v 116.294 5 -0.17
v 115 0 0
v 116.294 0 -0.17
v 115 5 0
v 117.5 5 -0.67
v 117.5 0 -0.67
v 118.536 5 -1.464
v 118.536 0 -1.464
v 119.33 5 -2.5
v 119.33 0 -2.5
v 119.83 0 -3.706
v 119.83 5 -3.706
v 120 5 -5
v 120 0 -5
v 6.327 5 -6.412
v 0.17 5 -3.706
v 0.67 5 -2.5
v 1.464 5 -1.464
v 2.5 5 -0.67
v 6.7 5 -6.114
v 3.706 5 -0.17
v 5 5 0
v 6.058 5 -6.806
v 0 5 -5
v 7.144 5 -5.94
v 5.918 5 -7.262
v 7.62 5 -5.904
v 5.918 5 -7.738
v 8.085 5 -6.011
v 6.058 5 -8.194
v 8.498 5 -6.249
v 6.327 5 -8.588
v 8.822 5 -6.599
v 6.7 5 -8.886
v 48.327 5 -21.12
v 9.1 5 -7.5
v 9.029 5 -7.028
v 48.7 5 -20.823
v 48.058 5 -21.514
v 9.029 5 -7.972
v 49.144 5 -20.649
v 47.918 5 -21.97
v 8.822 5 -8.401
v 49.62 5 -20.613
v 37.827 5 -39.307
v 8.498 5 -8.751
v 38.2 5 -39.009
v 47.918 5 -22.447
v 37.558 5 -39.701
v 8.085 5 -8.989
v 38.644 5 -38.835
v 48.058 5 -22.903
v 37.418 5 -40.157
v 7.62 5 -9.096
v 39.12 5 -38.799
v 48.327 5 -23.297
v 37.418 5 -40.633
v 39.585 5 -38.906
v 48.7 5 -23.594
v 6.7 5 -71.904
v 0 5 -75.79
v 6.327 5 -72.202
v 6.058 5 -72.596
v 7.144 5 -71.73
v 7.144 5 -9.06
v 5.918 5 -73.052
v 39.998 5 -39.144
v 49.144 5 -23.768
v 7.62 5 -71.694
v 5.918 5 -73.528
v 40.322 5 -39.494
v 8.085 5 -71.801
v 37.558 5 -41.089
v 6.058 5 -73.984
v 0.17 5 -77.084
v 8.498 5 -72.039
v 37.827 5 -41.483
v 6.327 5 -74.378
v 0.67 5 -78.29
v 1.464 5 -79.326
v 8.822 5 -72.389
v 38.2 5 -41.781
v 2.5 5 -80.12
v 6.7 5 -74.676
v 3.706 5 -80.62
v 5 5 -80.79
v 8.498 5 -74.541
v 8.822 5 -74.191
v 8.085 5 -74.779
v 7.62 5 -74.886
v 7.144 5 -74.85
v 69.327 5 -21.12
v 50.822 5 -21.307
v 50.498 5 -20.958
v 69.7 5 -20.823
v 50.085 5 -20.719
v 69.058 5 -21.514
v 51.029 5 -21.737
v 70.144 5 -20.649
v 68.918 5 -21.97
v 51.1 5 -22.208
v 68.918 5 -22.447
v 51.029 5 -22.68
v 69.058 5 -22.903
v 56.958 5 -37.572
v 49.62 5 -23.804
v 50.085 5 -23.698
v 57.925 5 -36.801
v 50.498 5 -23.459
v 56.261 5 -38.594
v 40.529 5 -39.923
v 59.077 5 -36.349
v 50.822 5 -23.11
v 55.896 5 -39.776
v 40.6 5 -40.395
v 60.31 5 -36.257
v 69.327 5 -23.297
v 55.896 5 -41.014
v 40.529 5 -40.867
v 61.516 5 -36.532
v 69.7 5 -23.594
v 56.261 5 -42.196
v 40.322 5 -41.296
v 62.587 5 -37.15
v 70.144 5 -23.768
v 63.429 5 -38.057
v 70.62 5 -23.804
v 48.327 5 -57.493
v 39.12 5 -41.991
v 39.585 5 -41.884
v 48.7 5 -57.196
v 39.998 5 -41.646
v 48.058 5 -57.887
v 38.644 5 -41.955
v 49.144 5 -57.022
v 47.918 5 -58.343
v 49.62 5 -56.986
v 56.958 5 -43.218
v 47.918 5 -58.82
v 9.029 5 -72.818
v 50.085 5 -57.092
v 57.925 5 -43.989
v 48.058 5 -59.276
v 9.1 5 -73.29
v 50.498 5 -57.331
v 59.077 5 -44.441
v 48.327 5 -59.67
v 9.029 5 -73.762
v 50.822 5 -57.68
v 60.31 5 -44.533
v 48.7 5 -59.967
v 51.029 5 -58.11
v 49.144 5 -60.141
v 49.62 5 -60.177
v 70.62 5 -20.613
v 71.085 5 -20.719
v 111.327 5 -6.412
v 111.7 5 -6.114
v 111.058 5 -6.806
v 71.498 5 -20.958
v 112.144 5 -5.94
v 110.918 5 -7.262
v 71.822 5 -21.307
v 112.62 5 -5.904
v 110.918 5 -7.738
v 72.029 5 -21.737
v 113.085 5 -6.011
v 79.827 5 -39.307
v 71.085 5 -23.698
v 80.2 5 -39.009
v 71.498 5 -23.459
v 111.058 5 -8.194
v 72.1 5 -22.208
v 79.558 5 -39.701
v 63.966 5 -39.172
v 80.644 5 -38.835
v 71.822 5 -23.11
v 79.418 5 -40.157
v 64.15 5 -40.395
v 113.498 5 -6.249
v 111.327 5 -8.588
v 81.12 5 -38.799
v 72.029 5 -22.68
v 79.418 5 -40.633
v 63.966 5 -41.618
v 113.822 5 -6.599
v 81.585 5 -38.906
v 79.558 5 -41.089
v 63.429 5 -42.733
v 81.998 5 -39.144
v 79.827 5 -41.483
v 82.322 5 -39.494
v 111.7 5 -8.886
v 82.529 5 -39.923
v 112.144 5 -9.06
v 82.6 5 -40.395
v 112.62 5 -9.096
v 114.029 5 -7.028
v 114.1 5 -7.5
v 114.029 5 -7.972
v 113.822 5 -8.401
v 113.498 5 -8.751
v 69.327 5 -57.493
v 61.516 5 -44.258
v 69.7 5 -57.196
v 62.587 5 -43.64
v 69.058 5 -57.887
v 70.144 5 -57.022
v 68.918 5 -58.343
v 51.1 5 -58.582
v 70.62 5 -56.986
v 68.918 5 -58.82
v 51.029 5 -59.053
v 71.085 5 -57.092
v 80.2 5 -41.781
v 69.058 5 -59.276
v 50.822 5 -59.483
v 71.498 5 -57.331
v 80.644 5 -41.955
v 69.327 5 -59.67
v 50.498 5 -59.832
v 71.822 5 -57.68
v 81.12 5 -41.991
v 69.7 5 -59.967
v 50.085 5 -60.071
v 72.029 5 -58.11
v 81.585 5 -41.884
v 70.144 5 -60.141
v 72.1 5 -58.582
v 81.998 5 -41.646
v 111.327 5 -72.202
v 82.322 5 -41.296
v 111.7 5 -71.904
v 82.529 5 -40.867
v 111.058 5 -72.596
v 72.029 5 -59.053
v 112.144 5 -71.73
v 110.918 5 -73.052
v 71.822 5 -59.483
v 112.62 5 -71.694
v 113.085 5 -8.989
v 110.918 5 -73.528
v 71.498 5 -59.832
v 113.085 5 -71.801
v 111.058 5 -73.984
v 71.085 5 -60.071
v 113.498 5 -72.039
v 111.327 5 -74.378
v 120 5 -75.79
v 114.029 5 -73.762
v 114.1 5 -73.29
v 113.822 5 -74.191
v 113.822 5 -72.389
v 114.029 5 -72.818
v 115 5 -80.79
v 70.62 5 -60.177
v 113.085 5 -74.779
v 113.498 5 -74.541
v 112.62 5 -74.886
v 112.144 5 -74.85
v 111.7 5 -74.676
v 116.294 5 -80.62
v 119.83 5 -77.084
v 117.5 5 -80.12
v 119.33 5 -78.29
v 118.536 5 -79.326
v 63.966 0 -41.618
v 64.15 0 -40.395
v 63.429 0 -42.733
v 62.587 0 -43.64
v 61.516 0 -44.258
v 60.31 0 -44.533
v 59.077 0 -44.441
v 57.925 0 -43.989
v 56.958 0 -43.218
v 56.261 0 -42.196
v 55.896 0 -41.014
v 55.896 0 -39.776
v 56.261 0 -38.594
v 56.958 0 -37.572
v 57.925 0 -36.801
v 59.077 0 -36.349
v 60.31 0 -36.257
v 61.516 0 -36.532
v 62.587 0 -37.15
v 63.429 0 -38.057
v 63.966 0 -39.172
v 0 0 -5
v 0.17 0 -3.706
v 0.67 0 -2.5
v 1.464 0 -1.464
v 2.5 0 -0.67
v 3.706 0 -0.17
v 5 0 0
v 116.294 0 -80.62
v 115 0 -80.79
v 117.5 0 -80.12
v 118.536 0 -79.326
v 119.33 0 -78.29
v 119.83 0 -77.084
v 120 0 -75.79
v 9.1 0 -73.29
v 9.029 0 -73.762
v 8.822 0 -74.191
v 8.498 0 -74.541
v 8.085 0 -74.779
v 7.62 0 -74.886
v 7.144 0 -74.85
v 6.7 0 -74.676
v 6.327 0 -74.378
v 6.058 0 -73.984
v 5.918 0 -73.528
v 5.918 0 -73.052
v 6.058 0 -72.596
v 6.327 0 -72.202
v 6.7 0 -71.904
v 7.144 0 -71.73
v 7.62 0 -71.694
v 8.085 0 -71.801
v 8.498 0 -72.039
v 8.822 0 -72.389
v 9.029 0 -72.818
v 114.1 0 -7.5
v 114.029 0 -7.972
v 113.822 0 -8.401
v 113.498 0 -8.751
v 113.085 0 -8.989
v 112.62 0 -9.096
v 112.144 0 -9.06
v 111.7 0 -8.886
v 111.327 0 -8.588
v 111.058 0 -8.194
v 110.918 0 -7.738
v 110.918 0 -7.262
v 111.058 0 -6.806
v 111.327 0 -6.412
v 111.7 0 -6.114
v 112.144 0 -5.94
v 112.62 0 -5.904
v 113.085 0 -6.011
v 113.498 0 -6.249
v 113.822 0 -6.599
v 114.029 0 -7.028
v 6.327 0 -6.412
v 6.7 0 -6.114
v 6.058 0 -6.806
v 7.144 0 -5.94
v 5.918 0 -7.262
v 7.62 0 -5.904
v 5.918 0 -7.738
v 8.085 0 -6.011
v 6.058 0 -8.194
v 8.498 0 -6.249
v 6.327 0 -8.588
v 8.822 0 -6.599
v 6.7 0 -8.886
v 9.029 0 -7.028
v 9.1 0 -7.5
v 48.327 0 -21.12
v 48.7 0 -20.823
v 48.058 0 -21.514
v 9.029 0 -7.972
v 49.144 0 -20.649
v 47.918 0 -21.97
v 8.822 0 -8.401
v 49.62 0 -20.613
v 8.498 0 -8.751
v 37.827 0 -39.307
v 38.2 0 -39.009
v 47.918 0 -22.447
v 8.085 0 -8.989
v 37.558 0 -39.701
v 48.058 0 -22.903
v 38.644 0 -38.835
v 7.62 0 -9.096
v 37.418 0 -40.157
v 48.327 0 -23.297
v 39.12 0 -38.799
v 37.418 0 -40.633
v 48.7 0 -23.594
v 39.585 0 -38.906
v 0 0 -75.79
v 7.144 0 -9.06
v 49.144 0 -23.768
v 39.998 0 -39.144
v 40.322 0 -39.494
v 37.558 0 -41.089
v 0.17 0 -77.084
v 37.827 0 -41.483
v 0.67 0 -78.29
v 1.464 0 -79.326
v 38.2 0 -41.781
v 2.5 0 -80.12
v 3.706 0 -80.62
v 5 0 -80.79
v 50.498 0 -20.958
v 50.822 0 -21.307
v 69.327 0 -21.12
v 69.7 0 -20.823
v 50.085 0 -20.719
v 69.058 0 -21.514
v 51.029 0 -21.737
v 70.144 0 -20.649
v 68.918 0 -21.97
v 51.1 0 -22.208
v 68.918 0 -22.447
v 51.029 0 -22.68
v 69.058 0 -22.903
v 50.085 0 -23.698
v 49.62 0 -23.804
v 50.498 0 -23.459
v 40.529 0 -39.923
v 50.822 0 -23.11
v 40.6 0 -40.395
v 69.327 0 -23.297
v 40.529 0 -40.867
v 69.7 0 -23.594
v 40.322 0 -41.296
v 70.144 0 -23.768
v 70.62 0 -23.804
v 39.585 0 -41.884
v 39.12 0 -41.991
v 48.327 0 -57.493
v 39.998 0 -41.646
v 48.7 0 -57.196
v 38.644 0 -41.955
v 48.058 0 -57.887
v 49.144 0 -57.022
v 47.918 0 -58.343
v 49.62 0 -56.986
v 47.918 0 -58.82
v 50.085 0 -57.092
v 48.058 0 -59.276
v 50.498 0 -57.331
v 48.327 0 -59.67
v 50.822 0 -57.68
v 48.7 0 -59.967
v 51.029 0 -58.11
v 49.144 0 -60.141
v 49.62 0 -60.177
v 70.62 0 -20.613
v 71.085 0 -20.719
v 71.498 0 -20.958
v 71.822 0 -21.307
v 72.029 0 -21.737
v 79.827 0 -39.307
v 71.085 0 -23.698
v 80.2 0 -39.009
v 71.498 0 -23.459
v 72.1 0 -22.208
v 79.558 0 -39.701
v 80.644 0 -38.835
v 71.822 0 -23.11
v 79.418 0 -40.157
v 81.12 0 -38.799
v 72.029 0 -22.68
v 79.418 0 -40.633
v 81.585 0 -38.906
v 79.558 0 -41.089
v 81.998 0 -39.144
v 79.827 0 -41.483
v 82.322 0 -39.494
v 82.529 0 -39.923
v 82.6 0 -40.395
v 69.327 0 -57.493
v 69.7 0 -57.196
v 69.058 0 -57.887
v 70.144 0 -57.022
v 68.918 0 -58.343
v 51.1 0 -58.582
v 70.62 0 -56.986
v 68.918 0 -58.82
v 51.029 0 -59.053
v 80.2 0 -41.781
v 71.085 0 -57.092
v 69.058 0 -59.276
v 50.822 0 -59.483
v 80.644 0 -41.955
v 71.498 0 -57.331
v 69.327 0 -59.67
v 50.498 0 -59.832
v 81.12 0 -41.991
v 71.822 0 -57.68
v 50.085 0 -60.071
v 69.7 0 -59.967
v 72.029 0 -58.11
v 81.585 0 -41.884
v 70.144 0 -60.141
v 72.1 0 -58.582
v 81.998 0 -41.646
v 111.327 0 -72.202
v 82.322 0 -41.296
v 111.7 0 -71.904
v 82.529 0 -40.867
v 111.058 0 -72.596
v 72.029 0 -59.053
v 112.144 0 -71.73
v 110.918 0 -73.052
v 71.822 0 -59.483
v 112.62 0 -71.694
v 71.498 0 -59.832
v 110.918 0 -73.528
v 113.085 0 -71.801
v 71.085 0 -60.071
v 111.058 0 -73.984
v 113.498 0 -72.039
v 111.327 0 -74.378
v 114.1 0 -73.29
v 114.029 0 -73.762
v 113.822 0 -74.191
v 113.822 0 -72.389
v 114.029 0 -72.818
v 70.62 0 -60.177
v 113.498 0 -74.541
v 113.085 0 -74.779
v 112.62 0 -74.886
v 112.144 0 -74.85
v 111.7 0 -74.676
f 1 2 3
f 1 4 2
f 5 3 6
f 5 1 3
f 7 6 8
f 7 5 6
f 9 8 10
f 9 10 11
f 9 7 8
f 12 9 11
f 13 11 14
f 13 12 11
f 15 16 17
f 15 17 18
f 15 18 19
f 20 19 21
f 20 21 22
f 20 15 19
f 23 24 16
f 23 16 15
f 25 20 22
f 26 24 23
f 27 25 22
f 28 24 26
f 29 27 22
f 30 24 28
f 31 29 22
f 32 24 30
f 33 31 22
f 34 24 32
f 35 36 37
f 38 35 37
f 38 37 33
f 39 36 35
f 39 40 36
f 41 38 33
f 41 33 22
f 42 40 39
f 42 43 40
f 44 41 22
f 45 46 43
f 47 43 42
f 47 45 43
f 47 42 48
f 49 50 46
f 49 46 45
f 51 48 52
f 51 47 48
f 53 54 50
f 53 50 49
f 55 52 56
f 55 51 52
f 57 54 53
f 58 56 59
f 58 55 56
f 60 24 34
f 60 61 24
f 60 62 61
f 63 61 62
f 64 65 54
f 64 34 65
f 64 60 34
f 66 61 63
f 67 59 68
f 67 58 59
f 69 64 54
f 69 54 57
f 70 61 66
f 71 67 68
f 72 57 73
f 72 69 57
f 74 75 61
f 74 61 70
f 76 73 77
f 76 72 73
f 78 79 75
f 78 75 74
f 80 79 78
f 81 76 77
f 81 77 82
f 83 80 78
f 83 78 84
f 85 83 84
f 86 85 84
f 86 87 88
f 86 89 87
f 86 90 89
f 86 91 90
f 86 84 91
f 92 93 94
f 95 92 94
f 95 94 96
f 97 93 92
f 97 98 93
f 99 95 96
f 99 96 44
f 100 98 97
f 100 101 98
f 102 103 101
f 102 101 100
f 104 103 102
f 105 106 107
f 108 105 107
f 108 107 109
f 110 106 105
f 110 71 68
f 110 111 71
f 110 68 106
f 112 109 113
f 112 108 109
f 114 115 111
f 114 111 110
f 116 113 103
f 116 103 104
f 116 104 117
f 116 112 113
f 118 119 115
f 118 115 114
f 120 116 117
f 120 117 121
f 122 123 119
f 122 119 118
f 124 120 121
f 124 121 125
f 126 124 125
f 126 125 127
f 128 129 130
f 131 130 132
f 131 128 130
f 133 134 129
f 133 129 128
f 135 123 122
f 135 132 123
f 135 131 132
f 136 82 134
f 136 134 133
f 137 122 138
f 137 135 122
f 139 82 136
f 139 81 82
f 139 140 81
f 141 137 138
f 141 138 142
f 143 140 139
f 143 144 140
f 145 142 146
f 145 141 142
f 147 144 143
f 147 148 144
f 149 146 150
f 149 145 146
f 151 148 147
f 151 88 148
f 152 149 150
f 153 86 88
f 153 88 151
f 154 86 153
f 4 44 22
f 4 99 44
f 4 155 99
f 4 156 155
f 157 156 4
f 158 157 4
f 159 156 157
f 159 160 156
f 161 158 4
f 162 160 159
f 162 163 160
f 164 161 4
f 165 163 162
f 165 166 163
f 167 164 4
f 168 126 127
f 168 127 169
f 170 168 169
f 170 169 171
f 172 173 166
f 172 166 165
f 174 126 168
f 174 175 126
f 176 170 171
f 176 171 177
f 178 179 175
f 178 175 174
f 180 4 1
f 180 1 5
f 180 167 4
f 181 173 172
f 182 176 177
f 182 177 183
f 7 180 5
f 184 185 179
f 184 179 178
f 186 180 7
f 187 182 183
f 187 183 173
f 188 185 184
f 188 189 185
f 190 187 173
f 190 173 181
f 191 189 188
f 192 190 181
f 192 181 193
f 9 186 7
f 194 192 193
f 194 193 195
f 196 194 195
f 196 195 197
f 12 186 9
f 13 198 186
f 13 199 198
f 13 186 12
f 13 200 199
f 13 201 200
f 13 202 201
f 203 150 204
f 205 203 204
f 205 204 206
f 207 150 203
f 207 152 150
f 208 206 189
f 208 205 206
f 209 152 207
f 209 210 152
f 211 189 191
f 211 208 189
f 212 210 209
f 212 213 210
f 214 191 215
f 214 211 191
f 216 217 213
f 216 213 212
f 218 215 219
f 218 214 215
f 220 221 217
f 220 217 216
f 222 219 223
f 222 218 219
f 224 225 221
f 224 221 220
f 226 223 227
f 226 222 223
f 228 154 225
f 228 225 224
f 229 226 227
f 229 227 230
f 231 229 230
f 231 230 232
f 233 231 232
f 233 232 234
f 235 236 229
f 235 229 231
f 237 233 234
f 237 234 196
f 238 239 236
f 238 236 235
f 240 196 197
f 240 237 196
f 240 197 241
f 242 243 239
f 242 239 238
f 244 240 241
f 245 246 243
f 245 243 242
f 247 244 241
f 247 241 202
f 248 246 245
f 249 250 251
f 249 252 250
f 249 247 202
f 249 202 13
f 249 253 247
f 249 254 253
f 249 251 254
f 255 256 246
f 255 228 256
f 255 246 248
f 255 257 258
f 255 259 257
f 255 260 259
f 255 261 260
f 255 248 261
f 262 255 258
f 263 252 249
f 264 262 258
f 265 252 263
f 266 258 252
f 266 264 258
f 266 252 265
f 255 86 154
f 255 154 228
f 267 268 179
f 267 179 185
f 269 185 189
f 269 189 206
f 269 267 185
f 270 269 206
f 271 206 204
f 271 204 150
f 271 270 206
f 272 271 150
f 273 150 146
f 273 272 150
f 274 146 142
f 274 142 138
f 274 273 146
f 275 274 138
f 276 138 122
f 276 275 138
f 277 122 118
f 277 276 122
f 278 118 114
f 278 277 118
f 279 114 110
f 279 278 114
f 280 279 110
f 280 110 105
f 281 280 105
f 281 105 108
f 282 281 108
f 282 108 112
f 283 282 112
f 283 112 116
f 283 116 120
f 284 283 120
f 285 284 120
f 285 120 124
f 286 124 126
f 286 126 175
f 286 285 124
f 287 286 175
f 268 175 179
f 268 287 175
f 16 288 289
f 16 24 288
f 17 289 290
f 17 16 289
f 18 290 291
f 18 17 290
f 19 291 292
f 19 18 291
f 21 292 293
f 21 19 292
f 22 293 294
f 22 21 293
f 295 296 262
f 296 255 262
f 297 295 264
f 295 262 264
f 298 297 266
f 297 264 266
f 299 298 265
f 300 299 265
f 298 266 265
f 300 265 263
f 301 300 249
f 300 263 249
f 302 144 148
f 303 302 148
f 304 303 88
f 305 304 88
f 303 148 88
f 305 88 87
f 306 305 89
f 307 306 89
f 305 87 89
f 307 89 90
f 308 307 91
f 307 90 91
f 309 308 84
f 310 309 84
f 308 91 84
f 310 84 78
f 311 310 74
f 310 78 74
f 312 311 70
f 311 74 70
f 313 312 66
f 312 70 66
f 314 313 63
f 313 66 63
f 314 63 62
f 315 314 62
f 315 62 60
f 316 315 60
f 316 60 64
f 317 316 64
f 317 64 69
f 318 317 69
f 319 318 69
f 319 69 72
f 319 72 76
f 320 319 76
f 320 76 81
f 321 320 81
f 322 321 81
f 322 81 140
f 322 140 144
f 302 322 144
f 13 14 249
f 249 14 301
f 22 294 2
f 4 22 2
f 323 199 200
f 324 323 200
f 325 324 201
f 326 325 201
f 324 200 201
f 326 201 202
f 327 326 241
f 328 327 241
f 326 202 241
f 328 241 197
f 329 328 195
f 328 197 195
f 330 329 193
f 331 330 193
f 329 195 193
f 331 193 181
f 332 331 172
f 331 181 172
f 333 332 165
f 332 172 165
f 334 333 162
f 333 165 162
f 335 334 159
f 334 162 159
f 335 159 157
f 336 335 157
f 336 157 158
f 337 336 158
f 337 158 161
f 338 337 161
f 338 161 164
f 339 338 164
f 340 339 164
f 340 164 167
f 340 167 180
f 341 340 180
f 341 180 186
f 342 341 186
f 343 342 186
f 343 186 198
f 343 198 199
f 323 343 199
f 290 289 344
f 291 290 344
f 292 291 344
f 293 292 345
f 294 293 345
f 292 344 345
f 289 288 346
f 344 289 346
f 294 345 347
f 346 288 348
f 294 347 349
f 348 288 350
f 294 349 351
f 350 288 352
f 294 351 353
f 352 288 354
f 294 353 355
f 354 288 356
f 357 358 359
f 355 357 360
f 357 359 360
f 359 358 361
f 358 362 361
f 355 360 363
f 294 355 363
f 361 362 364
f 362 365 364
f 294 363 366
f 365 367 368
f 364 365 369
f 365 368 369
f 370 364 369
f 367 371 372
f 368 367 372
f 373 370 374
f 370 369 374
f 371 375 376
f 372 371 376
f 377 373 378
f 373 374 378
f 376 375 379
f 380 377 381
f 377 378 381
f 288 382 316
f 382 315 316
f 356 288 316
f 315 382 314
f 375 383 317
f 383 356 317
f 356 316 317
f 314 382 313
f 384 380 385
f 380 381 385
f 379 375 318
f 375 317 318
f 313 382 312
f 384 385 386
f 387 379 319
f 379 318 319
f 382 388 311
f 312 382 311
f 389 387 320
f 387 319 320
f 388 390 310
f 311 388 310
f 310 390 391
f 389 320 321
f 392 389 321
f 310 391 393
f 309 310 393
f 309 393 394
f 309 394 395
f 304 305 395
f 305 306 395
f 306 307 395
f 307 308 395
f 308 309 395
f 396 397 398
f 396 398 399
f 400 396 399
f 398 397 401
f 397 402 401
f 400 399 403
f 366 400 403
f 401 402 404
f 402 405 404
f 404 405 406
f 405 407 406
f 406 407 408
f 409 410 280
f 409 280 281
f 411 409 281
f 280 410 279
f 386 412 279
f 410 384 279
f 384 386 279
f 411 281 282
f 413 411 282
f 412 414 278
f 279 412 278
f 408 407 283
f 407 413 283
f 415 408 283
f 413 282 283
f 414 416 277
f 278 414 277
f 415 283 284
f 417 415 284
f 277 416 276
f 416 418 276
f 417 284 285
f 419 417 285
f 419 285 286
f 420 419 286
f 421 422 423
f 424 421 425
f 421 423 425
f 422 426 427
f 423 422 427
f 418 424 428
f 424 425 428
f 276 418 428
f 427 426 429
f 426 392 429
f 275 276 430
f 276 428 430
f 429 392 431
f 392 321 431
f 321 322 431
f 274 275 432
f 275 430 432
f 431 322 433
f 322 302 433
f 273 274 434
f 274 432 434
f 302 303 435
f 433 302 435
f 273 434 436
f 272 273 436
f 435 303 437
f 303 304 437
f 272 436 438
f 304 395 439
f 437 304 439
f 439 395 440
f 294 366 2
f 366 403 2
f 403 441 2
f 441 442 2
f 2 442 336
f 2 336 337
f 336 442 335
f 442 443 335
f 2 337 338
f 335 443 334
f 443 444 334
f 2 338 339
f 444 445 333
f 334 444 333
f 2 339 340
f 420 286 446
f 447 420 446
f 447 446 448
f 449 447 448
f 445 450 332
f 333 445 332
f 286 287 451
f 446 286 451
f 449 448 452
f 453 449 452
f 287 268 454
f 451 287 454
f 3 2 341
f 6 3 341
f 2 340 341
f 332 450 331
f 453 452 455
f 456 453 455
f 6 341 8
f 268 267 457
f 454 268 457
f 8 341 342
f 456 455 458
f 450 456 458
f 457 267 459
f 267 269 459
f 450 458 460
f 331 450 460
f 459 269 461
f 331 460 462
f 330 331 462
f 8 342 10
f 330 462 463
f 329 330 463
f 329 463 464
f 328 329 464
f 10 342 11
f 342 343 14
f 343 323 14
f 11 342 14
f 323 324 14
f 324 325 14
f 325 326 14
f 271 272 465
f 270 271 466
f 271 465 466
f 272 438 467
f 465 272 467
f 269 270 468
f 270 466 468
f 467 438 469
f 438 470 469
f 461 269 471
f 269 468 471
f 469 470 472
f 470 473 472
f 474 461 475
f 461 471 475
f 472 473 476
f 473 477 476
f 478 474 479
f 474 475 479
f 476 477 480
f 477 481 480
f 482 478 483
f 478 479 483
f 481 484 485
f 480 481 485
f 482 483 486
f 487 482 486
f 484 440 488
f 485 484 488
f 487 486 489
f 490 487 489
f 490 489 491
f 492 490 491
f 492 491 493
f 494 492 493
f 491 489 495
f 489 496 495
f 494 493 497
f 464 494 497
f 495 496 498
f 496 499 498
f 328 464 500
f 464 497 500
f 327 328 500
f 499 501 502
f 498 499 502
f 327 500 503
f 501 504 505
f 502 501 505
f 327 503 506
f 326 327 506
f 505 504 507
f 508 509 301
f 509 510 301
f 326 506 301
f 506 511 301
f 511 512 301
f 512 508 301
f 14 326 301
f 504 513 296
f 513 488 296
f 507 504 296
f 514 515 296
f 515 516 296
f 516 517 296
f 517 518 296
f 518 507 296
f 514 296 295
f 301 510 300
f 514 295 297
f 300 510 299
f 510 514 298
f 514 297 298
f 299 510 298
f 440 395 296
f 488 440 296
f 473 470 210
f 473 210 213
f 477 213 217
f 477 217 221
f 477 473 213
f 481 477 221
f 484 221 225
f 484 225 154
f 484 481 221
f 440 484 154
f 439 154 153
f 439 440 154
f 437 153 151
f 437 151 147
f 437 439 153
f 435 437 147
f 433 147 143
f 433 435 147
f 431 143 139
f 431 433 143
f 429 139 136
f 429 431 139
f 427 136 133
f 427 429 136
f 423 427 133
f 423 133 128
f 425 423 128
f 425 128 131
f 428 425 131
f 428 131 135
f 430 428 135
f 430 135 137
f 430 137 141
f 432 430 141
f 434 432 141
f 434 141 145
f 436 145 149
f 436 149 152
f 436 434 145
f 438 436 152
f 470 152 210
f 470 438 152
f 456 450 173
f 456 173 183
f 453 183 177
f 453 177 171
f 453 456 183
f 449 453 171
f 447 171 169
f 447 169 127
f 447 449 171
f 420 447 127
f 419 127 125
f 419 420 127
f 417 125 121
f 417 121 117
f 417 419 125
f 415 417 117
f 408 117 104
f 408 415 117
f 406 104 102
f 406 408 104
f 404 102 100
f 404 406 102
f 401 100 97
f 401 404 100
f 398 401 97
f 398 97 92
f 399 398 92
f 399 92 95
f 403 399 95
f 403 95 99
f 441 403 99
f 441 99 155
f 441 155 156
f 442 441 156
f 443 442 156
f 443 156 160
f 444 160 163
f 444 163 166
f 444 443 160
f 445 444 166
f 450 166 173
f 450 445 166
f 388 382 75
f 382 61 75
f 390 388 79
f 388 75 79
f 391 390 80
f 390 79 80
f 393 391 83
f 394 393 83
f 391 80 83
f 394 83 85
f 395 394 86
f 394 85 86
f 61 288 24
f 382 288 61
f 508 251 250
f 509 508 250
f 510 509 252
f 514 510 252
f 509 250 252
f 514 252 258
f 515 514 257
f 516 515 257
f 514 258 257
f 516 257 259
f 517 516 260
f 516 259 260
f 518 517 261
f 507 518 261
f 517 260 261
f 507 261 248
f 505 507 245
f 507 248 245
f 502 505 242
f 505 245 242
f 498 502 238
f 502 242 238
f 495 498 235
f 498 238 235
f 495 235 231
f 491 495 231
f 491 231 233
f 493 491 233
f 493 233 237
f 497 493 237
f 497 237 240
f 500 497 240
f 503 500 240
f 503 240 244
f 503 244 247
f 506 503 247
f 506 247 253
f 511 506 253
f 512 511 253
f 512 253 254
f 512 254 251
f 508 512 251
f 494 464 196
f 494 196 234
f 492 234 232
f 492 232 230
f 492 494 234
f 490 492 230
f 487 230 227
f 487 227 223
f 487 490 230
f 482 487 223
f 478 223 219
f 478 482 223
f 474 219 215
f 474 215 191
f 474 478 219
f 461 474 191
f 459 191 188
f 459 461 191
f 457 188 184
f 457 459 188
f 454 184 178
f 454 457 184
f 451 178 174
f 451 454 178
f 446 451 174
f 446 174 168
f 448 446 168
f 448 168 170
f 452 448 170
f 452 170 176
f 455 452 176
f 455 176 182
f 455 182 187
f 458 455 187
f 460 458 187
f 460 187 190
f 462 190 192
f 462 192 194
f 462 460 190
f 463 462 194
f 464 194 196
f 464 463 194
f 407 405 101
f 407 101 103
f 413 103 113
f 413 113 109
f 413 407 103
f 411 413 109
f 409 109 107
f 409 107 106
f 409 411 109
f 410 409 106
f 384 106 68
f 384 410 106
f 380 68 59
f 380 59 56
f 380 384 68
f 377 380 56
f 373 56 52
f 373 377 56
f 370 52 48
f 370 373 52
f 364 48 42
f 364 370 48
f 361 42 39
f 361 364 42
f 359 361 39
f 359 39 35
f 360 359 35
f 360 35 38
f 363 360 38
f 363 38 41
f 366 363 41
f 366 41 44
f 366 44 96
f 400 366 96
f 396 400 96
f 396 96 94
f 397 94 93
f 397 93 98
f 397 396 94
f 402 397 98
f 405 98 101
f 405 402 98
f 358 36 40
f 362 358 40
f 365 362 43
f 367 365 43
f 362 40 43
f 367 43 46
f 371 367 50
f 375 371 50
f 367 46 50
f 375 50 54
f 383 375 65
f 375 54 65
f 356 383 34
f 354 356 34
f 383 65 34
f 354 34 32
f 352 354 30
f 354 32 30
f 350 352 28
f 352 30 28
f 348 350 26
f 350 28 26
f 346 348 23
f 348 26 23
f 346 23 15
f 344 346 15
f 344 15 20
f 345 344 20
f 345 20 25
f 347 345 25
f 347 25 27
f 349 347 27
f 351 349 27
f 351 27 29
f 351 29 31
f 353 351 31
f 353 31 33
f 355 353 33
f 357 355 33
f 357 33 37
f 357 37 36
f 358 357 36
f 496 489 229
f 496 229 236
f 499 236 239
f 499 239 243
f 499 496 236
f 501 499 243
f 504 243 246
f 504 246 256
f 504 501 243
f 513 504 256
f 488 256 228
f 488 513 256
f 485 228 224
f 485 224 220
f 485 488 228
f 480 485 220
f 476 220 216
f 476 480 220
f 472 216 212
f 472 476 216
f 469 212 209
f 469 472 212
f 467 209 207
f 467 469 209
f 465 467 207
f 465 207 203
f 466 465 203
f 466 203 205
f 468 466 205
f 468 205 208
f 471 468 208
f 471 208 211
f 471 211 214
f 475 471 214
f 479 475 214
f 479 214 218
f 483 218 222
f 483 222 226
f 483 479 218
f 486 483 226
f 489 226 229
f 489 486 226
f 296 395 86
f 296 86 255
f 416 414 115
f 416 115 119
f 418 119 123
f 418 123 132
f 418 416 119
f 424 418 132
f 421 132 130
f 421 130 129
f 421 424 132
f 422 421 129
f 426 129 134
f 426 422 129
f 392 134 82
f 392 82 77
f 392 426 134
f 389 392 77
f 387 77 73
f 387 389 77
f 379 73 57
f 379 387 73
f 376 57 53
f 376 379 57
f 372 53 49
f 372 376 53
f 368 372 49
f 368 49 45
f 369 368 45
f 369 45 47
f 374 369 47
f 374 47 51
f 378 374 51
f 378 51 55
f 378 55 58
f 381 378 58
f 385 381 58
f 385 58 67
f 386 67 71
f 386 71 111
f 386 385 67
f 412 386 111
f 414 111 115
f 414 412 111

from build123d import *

# Parameters (mm, degrees)
SKETCH1_W           = 120
SKETCH1_H           = 80.79
SKETCH1_R           = 1.6
SKETCH1_R_2         = 4.15
BOSS_EXTRUDE1_DEPTH = 5
SKETCH2_R           = 1.6
CUT_EXTRUDE1_DEPTH  = 6
FILLET1_R           = 5


with BuildPart() as part:
    # Sketch1 → Boss-Extrude1 (new body)
    with BuildSketch(Plane(origin=(0, 0, 0), x_dir=(1, 0, 0), z_dir=(0, 1, 0))):
        with Locations((60, 40.395)):
            Rectangle(SKETCH1_W, SKETCH1_H)
        with Locations((39, 40.395)):
            Circle(SKETCH1_R, mode=Mode.SUBTRACT)
        with Locations((49.5, 58.581533479)):
            Circle(SKETCH1_R, mode=Mode.SUBTRACT)
        with Locations((70.5, 58.581533479)):
            Circle(SKETCH1_R, mode=Mode.SUBTRACT)
        with Locations((81, 40.395)):
            Circle(SKETCH1_R, mode=Mode.SUBTRACT)
        with Locations((60, 40.395)):
            Circle(SKETCH1_R_2, mode=Mode.SUBTRACT)
        with Locations((70.5, 22.208466521)):
            Circle(SKETCH1_R, mode=Mode.SUBTRACT)
        with Locations((49.5, 22.208466521)):
            Circle(SKETCH1_R, mode=Mode.SUBTRACT)
    extrude(amount=BOSS_EXTRUDE1_DEPTH)

    # Sketch2 → Cut-Extrude1 (cut, through all)
    with BuildSketch(Plane(origin=(0, 5, 0), x_dir=(1, 0, 0), z_dir=(0, 1, 0))):
        with Locations((7.5, 73.29)):
            Circle(SKETCH2_R)
        with Locations((7.5, 7.5)):
            Circle(SKETCH2_R)
        with Locations((112.5, 73.29)):
            Circle(SKETCH2_R)
        with Locations((112.5, 7.5)):
            Circle(SKETCH2_R)
    extrude(amount=-CUT_EXTRUDE1_DEPTH, mode=Mode.SUBTRACT)

    # Fillet1
    fillet1_edges = [part.edges().sort_by_distance(p)[0] for p in [
        (0, 2.5, -80.79),
        (120, 2.5, -80.79),
        (120, 2.5, 0),
        (0, 2.5, 0),
    ]]
    fillet(fillet1_edges, radius=FILLET1_R)


solid = part.part
